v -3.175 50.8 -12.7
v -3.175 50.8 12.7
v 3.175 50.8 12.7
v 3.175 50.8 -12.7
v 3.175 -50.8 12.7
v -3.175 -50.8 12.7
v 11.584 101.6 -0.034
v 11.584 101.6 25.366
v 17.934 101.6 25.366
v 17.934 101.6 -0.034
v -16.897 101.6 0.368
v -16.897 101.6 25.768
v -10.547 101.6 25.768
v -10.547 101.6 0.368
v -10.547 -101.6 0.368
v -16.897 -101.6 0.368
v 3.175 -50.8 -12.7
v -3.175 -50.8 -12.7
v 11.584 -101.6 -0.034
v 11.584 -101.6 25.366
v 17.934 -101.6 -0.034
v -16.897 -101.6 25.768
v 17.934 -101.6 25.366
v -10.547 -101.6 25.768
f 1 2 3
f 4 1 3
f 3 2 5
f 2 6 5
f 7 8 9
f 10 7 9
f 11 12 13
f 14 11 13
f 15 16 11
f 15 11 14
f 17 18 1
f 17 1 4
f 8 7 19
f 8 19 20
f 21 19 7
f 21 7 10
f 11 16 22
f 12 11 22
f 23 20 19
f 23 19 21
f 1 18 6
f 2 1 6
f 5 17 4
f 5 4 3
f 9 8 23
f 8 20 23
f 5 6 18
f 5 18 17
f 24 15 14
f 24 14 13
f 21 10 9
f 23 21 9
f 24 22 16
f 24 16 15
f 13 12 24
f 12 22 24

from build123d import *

# Parameters (mm, degrees)
F0_W     = 6.35
F0_H     = 25.4
F1_DEPTH = 101.6
F2_W     = 6.35
F2_H     = 25.4
F4_DEPTH = 101.6
F3_W     = 6.35
F3_H     = 25.4
F5_DEPTH = 50.8


with BuildPart() as f1:
    # F0 (on Front) → F1 (new body, symmetric)
    with BuildSketch(Plane.XZ):
        with Locations((14.759201, 12.666333)):
            Rectangle(F0_W, F0_H)
    extrude(amount=F1_DEPTH, both=True)


with BuildPart() as f4:
    # F2 (on Front) → F4 (new body, symmetric)
    with BuildSketch(Plane.XZ):
        with Locations((-13.721523, 13.068115)):
            Rectangle(F2_W, F2_H)
    extrude(amount=F4_DEPTH, both=True)


with BuildPart() as f5:
    # F3 (on Front) → F5 (new body, symmetric)
    with BuildSketch(Plane.XZ):
        Rectangle(F3_W, F3_H)
    extrude(amount=F5_DEPTH, both=True)


solid = Compound([f1.part, f4.part, f5.part])
